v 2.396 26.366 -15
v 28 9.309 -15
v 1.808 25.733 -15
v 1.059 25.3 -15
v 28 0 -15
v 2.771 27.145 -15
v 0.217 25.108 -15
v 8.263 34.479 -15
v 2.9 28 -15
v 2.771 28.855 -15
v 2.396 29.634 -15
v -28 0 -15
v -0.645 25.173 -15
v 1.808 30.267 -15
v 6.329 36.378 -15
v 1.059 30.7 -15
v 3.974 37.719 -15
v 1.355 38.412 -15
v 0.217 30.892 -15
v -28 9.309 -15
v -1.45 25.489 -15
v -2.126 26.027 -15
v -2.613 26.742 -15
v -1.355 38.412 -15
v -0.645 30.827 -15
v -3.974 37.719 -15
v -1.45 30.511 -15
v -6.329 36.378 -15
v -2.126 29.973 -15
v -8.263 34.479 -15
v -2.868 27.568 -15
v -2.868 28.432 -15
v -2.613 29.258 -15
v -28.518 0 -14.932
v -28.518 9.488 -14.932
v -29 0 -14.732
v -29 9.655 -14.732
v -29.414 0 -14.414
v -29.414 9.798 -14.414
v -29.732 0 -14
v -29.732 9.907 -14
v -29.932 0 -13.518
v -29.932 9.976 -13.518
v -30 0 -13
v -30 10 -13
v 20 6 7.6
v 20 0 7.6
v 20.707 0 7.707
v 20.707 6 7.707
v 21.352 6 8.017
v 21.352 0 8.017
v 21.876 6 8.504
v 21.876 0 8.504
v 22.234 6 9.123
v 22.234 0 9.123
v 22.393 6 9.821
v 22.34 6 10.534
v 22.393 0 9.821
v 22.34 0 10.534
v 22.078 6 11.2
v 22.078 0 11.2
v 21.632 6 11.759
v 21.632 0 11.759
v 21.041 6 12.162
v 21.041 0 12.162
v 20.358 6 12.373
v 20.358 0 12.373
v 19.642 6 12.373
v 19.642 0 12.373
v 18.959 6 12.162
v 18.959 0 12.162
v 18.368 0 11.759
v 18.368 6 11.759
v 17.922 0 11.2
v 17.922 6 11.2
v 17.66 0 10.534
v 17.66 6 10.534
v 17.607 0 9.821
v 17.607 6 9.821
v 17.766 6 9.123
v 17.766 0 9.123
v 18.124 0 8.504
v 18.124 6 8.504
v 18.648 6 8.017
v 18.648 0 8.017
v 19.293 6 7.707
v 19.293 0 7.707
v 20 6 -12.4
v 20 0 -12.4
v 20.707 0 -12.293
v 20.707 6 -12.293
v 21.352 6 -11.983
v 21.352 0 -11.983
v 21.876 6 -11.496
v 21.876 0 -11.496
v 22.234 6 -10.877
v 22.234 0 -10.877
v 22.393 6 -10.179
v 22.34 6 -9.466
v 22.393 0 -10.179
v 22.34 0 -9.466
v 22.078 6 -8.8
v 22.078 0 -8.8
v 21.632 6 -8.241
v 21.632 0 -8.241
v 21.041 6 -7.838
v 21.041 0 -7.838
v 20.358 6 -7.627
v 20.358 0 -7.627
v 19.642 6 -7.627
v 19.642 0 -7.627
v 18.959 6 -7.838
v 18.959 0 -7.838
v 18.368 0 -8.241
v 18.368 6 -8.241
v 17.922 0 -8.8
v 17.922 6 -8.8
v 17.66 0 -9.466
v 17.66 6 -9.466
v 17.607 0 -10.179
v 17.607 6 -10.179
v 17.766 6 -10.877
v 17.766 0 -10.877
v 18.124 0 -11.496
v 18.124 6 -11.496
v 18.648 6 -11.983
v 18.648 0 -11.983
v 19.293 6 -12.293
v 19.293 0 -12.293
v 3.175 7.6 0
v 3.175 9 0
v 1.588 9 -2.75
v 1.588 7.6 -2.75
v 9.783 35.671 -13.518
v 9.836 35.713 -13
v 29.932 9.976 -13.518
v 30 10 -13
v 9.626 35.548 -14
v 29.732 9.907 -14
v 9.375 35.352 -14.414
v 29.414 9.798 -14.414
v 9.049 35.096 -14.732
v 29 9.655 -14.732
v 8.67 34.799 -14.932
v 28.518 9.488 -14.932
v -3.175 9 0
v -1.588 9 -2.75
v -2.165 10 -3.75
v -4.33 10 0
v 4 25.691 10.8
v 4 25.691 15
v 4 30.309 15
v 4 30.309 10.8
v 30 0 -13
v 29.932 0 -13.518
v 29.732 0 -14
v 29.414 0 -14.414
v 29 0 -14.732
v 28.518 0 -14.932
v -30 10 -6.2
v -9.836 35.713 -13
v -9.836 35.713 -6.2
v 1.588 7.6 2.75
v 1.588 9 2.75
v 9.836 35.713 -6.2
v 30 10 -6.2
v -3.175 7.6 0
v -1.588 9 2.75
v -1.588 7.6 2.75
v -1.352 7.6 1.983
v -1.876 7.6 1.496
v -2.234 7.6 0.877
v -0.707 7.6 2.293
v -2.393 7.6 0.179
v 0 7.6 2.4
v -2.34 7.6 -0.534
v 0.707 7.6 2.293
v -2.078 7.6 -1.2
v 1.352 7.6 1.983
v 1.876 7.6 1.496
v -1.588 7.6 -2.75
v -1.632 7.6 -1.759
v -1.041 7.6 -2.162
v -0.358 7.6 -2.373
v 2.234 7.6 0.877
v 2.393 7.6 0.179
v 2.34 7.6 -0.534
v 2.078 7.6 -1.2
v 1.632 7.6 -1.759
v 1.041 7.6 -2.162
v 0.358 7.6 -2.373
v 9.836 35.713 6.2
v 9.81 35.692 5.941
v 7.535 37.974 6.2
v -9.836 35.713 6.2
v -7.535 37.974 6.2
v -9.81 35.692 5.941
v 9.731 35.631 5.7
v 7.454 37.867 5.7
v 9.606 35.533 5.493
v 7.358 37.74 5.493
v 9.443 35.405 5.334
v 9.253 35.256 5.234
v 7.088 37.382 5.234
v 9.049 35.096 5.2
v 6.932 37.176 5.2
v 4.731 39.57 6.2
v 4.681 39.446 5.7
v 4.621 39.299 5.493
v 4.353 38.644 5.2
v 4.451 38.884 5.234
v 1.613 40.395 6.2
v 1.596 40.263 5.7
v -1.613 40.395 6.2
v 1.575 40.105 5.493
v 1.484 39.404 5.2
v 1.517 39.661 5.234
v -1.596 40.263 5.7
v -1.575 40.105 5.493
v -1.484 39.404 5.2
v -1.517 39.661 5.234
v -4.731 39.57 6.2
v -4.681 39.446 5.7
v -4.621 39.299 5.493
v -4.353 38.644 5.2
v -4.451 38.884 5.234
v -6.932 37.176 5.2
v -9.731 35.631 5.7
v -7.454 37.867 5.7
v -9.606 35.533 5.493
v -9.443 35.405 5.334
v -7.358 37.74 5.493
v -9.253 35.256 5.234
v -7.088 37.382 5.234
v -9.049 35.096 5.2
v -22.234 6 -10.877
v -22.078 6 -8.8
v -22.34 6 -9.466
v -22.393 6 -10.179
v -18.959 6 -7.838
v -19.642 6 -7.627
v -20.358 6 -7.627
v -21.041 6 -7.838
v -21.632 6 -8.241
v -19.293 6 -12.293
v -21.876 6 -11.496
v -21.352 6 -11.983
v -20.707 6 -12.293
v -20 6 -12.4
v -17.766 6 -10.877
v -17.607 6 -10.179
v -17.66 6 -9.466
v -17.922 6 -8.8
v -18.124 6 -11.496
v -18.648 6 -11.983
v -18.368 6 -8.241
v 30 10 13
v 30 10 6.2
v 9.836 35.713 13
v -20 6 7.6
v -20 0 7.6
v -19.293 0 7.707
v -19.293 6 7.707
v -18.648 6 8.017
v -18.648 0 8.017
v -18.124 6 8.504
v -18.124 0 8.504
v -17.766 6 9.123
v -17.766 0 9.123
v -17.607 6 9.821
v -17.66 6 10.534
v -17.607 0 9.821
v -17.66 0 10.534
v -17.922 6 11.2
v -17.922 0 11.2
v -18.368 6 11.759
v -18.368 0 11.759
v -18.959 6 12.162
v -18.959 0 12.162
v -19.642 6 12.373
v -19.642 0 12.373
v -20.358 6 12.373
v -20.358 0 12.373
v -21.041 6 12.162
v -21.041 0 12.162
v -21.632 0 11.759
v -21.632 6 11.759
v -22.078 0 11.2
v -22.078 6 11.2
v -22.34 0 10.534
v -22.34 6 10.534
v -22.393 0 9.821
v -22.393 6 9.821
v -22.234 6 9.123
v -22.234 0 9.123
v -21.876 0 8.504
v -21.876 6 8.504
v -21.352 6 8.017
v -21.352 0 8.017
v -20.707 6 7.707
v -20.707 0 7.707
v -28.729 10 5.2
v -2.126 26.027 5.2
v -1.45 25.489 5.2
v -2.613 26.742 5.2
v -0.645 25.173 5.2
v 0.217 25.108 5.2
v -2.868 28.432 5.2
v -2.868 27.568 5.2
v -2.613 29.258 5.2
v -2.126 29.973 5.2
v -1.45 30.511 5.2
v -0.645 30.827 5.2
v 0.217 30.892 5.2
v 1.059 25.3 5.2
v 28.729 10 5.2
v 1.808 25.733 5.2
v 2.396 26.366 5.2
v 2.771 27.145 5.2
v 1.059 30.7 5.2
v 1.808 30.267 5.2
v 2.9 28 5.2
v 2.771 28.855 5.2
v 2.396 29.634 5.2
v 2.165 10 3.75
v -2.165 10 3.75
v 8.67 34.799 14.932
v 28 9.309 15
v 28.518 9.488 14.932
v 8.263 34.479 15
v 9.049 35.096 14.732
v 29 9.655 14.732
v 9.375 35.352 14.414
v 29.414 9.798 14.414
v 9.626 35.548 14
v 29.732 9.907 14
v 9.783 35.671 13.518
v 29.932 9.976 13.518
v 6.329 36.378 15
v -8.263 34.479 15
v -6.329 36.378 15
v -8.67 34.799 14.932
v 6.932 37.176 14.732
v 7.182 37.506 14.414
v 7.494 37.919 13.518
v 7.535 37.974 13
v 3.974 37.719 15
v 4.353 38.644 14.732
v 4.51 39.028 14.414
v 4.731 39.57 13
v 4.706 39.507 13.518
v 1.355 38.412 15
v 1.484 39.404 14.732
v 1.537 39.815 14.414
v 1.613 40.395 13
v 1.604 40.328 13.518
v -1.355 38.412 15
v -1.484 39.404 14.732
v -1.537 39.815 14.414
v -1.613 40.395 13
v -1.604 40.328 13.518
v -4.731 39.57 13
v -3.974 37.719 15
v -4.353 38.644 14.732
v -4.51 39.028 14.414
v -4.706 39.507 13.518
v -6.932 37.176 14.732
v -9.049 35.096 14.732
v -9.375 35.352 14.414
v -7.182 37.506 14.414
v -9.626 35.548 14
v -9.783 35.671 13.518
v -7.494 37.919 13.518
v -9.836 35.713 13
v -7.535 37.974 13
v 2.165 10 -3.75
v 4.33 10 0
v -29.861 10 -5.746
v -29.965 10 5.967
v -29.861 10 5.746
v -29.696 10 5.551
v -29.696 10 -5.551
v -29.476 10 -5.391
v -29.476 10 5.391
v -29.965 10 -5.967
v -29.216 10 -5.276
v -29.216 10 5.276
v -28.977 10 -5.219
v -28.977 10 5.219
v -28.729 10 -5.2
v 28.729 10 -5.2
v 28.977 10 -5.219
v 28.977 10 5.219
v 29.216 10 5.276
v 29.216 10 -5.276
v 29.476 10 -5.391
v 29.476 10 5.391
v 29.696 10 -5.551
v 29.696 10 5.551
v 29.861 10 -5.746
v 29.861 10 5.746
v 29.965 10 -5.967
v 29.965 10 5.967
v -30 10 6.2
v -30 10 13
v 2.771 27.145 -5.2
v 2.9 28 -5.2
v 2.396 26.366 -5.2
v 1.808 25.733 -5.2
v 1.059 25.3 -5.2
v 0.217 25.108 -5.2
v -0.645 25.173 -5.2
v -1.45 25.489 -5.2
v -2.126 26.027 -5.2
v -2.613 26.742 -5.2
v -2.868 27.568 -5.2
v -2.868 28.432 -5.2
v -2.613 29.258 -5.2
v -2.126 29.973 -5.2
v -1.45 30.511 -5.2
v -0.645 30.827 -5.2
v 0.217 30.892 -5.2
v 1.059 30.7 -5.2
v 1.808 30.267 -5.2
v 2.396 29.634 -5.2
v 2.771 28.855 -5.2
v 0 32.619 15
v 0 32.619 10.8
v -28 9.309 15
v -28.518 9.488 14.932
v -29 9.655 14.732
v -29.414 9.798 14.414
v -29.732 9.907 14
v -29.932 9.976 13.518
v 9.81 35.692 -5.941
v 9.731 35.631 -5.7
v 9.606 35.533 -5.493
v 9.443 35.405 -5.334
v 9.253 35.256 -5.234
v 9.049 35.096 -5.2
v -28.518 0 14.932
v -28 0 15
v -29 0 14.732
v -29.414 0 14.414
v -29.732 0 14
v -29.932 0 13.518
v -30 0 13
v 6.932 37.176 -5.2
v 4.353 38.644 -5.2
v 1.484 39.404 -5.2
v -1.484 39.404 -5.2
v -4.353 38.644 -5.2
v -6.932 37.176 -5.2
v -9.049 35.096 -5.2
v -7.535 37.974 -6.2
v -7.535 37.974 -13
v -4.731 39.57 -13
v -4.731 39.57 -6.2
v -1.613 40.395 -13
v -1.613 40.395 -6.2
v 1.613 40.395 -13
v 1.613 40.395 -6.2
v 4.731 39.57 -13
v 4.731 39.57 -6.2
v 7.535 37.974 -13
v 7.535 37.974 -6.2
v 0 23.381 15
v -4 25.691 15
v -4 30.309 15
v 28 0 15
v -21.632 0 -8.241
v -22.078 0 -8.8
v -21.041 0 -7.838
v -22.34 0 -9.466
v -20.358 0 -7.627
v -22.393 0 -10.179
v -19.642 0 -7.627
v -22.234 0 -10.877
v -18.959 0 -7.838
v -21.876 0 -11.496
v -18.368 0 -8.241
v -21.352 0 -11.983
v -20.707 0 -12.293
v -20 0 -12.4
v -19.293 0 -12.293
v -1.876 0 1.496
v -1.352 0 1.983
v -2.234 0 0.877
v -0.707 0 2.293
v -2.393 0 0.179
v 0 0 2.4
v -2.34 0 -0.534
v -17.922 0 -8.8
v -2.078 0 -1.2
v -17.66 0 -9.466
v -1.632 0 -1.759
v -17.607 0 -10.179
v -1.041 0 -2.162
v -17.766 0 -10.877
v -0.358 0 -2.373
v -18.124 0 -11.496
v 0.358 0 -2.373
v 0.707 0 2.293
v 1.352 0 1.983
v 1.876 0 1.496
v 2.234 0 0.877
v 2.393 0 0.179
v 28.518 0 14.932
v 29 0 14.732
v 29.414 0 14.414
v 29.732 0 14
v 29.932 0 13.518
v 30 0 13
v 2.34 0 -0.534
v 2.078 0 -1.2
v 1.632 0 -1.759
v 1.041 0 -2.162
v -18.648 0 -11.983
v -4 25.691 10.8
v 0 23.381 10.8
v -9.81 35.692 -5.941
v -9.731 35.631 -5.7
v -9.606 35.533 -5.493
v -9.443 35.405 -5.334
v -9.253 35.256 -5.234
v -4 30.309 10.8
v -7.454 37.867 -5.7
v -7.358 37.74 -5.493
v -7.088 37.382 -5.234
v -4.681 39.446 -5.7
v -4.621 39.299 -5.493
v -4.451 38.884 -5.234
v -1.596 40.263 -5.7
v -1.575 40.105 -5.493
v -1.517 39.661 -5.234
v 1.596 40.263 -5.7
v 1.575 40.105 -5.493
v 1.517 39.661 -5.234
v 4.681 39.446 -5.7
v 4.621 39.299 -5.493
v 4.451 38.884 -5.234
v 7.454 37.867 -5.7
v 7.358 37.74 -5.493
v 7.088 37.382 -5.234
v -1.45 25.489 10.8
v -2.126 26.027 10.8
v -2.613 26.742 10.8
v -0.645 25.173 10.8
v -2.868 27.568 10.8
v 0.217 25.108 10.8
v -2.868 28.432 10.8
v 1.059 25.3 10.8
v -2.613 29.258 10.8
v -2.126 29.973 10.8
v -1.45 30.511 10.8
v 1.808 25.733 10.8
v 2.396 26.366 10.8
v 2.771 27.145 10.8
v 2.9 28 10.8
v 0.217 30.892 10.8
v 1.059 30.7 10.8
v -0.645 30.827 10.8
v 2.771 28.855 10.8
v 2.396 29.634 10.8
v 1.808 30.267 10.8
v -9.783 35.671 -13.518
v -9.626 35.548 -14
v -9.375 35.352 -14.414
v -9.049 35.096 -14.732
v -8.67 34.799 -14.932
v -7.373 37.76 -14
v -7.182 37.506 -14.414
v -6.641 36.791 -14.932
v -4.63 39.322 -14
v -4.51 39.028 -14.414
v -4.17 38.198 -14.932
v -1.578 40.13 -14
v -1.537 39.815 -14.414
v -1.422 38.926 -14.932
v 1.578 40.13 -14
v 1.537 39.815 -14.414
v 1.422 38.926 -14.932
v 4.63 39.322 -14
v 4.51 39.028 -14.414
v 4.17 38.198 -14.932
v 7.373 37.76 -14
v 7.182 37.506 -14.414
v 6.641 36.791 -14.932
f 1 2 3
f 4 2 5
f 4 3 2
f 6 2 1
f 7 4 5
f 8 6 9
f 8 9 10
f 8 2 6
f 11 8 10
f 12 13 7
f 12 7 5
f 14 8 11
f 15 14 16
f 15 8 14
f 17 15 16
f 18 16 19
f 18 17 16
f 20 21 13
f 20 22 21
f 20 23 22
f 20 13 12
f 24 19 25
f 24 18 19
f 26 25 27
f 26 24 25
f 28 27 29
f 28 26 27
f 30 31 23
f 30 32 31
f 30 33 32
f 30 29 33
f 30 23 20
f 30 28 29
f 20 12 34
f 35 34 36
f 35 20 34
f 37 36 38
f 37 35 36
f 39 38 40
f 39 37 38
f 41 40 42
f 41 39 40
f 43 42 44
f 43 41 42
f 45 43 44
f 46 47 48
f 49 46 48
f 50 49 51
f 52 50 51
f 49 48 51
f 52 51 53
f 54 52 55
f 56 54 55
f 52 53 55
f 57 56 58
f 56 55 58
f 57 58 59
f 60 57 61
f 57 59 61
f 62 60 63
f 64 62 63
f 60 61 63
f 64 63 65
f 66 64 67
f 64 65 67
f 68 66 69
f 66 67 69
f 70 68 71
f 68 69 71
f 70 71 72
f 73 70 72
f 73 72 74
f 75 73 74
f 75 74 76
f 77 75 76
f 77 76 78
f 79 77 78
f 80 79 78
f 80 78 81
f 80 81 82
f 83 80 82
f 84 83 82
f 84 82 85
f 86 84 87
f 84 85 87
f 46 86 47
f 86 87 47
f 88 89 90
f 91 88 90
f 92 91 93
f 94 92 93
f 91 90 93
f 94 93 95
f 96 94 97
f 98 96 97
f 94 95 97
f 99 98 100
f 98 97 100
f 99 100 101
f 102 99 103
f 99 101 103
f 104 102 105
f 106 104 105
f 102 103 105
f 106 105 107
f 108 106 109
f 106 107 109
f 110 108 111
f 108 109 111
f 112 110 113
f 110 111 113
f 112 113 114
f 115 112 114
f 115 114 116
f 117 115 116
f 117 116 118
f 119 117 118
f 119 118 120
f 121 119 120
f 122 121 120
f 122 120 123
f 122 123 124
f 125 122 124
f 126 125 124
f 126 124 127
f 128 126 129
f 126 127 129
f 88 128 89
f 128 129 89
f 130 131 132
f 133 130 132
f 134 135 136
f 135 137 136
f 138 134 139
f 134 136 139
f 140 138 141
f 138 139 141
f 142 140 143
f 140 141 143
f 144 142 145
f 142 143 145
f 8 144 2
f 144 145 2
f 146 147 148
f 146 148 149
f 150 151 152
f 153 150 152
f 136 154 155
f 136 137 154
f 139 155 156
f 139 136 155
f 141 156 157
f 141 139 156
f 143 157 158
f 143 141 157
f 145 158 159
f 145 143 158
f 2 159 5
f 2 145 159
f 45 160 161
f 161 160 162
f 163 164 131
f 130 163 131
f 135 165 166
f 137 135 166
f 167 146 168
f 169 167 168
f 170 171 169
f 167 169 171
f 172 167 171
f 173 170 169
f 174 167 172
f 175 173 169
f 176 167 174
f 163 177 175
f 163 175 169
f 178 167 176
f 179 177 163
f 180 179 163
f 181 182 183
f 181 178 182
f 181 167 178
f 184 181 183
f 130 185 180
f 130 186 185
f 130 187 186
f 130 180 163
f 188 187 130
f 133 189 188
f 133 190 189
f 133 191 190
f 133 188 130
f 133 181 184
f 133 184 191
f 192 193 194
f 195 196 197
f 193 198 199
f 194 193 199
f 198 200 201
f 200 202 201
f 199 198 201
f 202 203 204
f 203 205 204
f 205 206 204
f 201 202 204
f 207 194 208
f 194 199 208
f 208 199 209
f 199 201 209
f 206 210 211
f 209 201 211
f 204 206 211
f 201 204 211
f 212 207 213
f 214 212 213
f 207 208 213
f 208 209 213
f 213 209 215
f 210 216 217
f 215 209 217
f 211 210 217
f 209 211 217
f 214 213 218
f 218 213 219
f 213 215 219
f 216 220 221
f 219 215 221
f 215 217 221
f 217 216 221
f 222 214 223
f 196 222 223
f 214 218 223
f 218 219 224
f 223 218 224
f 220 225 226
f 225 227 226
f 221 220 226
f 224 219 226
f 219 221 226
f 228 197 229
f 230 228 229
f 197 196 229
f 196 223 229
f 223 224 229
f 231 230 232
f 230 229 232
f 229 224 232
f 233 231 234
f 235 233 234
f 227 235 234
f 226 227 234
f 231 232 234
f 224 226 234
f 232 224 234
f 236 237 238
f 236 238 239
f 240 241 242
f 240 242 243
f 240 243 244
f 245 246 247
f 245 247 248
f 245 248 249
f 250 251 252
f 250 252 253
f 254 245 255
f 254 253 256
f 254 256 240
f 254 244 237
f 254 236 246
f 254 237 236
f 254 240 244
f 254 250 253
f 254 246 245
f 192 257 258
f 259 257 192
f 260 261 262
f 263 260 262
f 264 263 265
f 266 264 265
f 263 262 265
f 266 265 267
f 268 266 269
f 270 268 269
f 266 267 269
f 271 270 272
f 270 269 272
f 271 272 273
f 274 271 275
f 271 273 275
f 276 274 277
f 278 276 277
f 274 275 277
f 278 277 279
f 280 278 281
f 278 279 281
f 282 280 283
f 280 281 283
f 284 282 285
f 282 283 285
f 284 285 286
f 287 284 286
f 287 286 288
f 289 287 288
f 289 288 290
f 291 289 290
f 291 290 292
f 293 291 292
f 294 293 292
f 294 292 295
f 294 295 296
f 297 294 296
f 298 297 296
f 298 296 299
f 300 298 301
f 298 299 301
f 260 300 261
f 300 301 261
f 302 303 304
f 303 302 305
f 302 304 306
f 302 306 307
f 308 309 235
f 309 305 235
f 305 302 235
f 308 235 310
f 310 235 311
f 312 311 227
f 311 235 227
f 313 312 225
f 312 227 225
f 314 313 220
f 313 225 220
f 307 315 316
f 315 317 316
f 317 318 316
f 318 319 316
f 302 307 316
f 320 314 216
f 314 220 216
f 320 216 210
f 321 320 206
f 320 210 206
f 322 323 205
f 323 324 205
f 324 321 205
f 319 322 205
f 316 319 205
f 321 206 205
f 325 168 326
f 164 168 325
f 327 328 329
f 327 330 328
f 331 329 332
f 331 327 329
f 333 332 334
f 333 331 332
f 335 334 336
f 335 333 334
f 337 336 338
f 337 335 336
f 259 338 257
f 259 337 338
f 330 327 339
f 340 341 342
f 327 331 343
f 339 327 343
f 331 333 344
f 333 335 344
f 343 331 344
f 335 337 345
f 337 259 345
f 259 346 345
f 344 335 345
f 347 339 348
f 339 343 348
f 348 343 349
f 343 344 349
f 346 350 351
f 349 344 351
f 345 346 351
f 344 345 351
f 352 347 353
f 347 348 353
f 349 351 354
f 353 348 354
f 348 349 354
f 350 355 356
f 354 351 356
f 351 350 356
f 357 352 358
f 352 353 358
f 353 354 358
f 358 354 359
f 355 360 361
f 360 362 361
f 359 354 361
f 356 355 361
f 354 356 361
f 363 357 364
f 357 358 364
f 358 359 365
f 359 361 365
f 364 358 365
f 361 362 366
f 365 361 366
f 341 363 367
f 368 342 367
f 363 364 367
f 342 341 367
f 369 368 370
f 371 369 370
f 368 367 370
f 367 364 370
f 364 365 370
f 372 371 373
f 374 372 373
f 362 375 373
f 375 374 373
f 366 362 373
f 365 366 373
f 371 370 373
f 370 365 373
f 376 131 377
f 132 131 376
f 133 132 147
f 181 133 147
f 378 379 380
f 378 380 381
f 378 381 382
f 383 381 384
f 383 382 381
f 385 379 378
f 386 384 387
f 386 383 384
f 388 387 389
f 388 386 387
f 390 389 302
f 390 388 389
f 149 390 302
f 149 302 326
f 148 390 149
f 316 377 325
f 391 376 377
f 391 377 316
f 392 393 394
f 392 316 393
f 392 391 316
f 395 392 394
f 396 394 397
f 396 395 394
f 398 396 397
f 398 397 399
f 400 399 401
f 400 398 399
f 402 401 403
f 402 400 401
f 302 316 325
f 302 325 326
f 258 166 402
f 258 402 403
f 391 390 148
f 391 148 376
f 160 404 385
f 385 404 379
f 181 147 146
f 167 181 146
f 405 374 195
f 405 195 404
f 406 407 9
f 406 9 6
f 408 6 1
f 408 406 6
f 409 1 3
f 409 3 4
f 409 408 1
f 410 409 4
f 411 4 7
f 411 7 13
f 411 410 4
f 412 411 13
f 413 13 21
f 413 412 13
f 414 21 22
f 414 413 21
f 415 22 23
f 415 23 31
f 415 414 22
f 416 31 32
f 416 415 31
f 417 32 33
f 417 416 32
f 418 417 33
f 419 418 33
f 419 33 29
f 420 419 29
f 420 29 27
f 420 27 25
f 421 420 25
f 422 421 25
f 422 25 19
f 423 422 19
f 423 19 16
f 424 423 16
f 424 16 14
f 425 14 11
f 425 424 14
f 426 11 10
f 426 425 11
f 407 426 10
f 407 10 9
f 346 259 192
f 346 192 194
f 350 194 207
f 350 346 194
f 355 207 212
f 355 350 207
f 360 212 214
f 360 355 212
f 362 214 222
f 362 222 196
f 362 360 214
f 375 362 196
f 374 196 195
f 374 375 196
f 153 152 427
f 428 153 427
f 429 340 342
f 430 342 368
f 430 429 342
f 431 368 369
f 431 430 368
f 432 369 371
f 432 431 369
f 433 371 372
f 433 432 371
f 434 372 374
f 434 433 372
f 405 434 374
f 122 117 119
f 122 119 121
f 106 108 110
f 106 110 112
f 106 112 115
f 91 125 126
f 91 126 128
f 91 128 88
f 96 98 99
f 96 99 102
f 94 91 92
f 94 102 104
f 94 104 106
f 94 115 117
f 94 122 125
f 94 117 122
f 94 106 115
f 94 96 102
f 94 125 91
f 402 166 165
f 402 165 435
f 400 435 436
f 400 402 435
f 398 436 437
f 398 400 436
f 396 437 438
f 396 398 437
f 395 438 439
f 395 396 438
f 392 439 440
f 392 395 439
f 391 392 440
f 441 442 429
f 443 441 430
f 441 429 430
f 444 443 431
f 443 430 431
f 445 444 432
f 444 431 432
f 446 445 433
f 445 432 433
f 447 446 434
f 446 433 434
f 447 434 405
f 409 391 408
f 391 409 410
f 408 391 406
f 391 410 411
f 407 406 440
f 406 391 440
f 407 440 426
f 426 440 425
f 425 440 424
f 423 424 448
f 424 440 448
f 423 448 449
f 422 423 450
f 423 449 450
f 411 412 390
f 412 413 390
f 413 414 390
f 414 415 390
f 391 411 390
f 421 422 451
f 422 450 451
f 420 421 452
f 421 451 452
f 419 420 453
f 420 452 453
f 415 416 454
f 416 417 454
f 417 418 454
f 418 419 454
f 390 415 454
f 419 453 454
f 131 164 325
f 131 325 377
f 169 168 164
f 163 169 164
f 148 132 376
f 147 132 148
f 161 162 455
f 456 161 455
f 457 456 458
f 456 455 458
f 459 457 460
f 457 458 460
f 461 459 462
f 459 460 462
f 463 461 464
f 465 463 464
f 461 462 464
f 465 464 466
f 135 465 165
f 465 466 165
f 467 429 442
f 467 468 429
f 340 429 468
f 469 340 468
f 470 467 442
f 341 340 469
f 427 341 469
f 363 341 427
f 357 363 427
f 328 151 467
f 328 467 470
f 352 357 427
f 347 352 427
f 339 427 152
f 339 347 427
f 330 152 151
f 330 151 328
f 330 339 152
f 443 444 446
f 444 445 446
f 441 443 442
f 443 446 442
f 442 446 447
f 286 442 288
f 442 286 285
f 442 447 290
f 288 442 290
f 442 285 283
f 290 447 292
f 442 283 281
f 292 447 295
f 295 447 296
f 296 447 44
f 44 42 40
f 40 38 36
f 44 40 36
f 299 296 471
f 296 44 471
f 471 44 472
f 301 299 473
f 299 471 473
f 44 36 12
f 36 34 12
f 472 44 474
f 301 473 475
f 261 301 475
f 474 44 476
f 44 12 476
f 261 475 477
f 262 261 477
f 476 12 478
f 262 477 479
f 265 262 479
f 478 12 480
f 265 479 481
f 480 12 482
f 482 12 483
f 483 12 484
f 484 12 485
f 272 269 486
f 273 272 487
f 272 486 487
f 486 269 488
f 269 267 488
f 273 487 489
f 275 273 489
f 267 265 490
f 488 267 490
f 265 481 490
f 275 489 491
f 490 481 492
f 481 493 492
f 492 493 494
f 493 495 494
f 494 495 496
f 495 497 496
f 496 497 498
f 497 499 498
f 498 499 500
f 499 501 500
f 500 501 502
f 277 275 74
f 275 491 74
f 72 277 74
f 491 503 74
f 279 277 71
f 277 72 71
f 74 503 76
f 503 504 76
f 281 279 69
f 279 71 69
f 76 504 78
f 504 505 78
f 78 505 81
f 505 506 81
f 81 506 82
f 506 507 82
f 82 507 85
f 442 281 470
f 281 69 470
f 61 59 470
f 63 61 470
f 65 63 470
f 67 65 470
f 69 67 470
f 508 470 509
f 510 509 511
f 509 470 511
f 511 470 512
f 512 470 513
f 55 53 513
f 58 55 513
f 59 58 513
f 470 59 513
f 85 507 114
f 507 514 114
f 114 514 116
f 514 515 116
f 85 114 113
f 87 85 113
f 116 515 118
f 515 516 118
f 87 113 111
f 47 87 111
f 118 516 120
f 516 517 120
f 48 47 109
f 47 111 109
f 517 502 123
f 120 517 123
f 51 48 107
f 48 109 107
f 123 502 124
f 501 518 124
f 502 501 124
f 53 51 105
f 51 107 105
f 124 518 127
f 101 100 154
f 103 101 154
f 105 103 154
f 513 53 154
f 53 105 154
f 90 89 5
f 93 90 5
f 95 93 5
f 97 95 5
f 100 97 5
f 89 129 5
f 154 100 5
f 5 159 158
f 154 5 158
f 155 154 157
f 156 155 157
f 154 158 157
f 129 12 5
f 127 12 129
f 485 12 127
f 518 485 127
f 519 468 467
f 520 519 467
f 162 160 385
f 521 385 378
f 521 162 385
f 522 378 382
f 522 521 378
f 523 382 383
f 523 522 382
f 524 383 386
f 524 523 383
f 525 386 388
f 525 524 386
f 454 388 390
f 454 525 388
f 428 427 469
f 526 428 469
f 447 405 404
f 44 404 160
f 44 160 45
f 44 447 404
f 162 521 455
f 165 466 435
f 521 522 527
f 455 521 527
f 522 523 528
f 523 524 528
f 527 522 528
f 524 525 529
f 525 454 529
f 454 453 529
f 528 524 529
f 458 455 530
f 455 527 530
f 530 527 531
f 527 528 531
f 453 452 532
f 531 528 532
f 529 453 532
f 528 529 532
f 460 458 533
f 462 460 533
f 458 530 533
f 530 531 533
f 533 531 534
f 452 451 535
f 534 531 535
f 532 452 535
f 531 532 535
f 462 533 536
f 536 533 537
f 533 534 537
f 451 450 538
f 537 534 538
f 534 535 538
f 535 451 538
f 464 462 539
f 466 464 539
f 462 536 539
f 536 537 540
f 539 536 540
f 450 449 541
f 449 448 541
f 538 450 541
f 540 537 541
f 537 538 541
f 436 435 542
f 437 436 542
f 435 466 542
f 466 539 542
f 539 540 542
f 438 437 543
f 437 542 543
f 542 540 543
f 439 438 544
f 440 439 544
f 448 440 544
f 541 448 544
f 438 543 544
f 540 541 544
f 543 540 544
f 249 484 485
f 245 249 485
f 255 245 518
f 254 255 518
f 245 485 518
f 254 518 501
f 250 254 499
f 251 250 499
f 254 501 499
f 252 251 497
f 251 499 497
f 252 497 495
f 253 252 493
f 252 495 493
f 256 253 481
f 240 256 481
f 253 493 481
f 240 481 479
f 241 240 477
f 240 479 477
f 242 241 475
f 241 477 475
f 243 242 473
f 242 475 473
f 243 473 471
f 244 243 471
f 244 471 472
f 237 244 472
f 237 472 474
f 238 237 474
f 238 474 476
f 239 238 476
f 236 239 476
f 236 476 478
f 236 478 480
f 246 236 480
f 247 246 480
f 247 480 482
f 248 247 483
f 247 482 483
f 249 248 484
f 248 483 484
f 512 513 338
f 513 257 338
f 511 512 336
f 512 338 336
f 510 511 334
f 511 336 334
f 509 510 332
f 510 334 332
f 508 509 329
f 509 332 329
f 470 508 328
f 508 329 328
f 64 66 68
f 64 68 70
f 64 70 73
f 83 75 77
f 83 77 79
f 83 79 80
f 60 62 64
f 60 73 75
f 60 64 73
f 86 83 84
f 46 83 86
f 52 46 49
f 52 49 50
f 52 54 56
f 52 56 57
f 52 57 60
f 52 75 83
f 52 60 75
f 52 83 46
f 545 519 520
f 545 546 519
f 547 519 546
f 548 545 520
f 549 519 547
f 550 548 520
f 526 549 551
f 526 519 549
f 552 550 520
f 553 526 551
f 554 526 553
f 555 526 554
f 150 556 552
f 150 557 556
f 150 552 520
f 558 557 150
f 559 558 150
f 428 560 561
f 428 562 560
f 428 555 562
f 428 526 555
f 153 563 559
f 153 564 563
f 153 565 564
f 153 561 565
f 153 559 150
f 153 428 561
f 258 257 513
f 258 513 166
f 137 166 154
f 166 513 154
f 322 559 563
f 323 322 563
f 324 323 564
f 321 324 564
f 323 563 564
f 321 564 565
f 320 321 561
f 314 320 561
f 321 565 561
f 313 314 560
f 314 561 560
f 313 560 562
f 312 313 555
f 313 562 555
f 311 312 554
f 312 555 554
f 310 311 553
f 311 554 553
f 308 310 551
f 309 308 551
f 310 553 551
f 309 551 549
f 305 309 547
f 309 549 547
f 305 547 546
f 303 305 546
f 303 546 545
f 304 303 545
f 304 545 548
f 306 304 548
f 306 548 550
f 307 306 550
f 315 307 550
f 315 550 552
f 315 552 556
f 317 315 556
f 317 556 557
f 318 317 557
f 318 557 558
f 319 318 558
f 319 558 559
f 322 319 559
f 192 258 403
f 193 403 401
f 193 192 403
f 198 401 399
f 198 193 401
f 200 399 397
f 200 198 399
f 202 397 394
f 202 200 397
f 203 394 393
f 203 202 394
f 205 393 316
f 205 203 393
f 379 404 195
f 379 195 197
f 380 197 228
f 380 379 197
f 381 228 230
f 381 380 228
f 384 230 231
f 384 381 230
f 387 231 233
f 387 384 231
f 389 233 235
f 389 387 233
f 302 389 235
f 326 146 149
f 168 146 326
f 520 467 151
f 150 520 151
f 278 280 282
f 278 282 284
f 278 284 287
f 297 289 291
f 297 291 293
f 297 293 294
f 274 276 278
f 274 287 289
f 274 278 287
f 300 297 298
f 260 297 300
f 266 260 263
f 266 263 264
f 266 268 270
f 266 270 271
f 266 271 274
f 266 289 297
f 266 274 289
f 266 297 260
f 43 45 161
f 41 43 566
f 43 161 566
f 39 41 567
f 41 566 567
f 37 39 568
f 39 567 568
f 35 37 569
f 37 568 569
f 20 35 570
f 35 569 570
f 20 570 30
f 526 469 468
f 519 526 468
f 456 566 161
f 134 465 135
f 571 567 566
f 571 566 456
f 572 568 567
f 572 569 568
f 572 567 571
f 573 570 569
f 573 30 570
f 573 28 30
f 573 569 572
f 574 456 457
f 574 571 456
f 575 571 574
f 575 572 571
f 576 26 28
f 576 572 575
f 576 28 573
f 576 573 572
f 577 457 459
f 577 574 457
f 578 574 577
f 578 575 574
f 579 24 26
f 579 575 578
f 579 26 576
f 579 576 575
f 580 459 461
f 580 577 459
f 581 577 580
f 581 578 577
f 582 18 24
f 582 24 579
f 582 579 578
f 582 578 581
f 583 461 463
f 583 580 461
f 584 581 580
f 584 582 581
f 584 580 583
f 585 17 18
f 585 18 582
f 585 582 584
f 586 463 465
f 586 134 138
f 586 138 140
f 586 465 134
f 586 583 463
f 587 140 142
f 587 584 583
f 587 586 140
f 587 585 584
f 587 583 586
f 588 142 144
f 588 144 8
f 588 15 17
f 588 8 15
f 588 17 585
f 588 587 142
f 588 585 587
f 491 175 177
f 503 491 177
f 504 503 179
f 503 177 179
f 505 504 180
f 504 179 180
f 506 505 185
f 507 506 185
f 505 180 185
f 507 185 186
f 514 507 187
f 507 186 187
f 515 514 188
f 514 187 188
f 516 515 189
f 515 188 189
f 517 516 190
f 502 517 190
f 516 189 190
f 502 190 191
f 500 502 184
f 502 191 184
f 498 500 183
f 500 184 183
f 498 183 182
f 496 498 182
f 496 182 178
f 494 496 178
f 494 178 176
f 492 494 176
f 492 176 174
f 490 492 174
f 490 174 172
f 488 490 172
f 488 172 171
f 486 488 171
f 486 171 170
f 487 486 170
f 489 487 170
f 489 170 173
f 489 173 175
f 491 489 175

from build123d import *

# Parameters (mm, degrees)
SKETCH_1_W          = 60
SKETCH_1_H          = 30
EXTRUDE_1_DEPTH     = 10
SKETCH_2_R          = 2.9
EXTRUDE_2_DEPTH     = 9.8
EXTRUDE_START       = -9.8
SKETCH_4_R          = 2.9
EXTRUDE_3_DEPTH     = 9.8
SKETCH_5_R          = 2.4
CUT_EXTRUDE_1_DEPTH = 6
CUT_EXTRUDE_2_DEPTH = 4.2
CUT_EXTRUDE_3_DEPTH = 2.4
SKETCH_8_R          = 2.4
CUT_EXTRUDE_4_DEPTH = 47.983082062
FILLET_1_R          = 1
FILLET_2_R          = 2
CHAMFER_5_SIZE      = 1


with BuildPart() as part:
    # 草圖1 → 填料-伸長1 (new body)
    with BuildSketch(Plane(origin=(0, 0, 0), x_dir=(1, 0, 0), z_dir=(0, 1, 0))):
        Rectangle(SKETCH_1_W, SKETCH_1_H)
    extrude(amount=EXTRUDE_1_DEPTH)

    # 草圖2 → 填料-伸長2 (add)
    with BuildSketch(Plane.XY.offset(15)):
        with BuildLine():
            Line((-9.836356149, 35.713371359), (-30, 10))
            Line((-30, 10), (30, 10))
            Line((30, 10), (9.836356149, 35.713371359))
            ThreePointArc((9.836356149, 35.713371359), (0, 40.5), (-9.836356149, 35.713371359))
        make_face()
        with Locations((0, 28)):
            Circle(SKETCH_2_R, mode=Mode.SUBTRACT)
    extrude(amount=-EXTRUDE_2_DEPTH)

    # 草圖4 → 填料-伸長3 (add)
    with BuildSketch(Plane(origin=(0, 0, -15), x_dir=(-1, 0, 0), z_dir=(0, 0, -1)).offset(EXTRUDE_START)):
        with BuildLine():
            Line((30, 10), (9.836356149, 35.713371359))
            ThreePointArc((9.836356149, 35.713371359), (0, 40.5), (-9.836356149, 35.713371359))
            Line((-9.836356149, 35.713371359), (-30, 10))
            Line((-30, 10), (30, 10))
        make_face()
        with Locations(Location((0, 28, 0), (0, 0, 180))):
            Circle(SKETCH_4_R, mode=Mode.SUBTRACT)
    extrude(amount=EXTRUDE_3_DEPTH)

    # 草圖5 → 除料-伸長1 (cut)
    with BuildSketch(Plane.XZ):
        with Locations(Location((20, 10, 0), (0, 0, 270))):
            Circle(SKETCH_5_R)
        with Locations(Location((20, -10, 0), (0, 0, 270))):
            Circle(SKETCH_5_R)
        with Locations(Location((-20, -10, 0), (0, 0, 270))):
            Circle(SKETCH_5_R)
        with Locations(Location((-20, 10, 0), (0, 0, 270))):
            Circle(SKETCH_5_R)
    extrude(amount=-CUT_EXTRUDE_1_DEPTH, mode=Mode.SUBTRACT)

    # 草圖6 → 除料-伸長2 (cut)
    with BuildSketch(Plane.XY.offset(15)):
        Polygon((0, 32.618802154), (-4, 30.309401077), (-4, 25.690598923), (0, 23.381197846), (4, 25.690598923), (4, 30.309401077), align=None)
    extrude(amount=-CUT_EXTRUDE_2_DEPTH, mode=Mode.SUBTRACT)

    # 草圖7 → 除料-伸長3 (cut)
    with BuildSketch(Plane(origin=(0, 10, 0), x_dir=(1, 0, 0), z_dir=(0, 1, 0))):
        Polygon((3.175426481, 0), (1.58771324, 2.75), (-1.58771324, 2.75), (-3.175426481, 0), (-1.58771324, -2.75), (1.58771324, -2.75), align=None)
    extrude(amount=-CUT_EXTRUDE_3_DEPTH, mode=Mode.SUBTRACT)

    # 草圖8 → 除料-伸長4 (cut, through all)
    with BuildSketch(Plane(origin=(0, 7.6, 0), x_dir=(1, 0, 0), z_dir=(0, 1, 0))):
        with Locations(Location((0, 0, 0), (0, 0, 270))):
            Circle(SKETCH_8_R)
    extrude(amount=-CUT_EXTRUDE_4_DEPTH, mode=Mode.SUBTRACT)

    # 圓角1
    fillet_1_edges = [part.edges().sort_by_distance(p)[0] for p in [
        (-19.918178074, 22.856685679, 5.2),
        (0, 40.5, 5.2),
        (19.918178074, 22.856685679, 5.2),
        (0, 40.5, -5.2),
        (-19.918178074, 22.856685679, -5.2),
        (19.918178074, 22.856685679, -5.2),
    ]]
    fillet(fillet_1_edges, radius=FILLET_1_R)

    # 圓角2
    fillet_2_edges = [part.edges().sort_by_distance(p)[0] for p in [
        (19.918178074, 22.856685679, 15),
        (0, 40.5, 15),
        (-19.918178074, 22.856685679, 15),
        (0, 40.5, -15),
        (19.918178074, 22.856685679, -15),
        (-19.918178074, 22.856685679, -15),
        (30, 5, 15),
        (-30, 5, 15),
        (-30, 5, -15),
        (30, 5, -15),
    ]]
    fillet(fillet_2_edges, radius=FILLET_2_R)

    # 導角5
    chamfer_5_edges = [part.edges().sort_by_distance(p)[0] for p in [
        (2.38156986, 10, 1.375),
        (2.38156986, 10, -1.375),
        (0, 10, -2.75),
        (-2.38156986, 10, -1.375),
        (-2.38156986, 10, 1.375),
        (0, 10, 2.75),
    ]]
    chamfer(chamfer_5_edges, length=CHAMFER_5_SIZE)


solid = part.part
